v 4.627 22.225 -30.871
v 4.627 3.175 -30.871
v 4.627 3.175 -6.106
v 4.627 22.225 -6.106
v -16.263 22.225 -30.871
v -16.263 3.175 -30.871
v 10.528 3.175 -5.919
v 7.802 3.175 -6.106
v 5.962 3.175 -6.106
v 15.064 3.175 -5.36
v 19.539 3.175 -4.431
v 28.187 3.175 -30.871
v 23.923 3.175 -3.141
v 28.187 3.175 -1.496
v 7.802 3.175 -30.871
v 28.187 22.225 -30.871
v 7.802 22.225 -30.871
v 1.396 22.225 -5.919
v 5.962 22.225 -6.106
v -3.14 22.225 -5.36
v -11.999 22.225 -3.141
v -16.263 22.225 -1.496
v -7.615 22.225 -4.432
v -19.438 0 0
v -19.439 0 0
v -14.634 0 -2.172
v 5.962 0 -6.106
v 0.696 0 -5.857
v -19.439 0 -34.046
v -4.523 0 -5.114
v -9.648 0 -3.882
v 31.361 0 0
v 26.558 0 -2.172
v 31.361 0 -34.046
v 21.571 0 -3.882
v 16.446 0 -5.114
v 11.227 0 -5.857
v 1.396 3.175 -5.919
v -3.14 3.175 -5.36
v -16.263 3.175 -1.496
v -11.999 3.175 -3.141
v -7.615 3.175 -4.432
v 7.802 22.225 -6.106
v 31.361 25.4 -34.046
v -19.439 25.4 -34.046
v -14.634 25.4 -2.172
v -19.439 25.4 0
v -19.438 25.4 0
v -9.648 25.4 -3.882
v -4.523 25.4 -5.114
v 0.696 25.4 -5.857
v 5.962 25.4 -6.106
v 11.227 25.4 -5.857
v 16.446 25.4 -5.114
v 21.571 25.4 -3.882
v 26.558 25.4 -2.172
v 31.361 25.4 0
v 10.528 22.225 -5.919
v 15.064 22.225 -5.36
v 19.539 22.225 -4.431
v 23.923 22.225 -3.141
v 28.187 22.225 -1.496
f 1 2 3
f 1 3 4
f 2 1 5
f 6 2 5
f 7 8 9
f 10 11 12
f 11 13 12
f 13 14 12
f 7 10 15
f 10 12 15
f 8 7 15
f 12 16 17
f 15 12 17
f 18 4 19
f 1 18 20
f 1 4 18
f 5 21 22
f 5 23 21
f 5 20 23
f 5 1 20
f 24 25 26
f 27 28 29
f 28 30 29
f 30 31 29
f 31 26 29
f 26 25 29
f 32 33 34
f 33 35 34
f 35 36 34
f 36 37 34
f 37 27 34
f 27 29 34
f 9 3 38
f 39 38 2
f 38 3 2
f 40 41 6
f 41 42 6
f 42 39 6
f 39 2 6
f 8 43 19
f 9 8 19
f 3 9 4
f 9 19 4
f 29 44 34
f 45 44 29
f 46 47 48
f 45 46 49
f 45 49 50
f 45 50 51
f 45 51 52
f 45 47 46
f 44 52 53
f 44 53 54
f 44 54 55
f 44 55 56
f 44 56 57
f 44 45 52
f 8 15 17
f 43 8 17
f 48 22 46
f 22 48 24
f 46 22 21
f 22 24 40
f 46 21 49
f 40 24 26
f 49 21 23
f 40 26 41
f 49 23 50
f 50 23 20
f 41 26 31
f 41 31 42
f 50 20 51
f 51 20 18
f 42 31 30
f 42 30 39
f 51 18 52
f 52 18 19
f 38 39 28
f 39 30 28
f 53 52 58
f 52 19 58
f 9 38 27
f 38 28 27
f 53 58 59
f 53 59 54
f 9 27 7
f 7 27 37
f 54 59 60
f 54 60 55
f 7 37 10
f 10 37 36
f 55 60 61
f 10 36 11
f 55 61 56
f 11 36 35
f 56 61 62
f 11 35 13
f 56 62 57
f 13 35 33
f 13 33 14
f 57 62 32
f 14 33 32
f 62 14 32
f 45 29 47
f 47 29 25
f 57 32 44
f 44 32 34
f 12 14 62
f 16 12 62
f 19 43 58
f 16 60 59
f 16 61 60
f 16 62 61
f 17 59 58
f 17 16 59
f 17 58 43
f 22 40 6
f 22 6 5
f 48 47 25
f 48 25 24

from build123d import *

# Parameters (mm, degrees)
BOSS_EXTRUDE2_DEPTH = 25.4
CUT_EXTRUDE1_START  = -3.175
SKETCH3_W           = 44.45
SKETCH3_H           = 19.05
CUT_EXTRUDE1_DEPTH  = 50.624586707
SKETCH4_W           = 3.175
SKETCH4_H           = 25.4
BOSS_EXTRUDE3_DEPTH = 27.94


with BuildPart() as part:
    # Sketch1 → Boss-Extrude2 (new body)
    with BuildSketch(Plane(origin=(0, 0, 0), x_dir=(1, 0, 0), z_dir=(0, 1, 0))):
        with BuildLine():
            Line((31.360925226, 34.045979578), (-19.439074774, 34.045979578))
            Line((-19.439074774, 34.045979578), (-19.439074774, 0))
            Line((-19.439074774, 0), (-19.437550774, 0))
            ThreePointArc((-19.437550774, 0), (5.961687226, 6.105979578), (31.360925226, 0))
            Line((31.360925226, 0), (31.360925226, 34.045979578))
        make_face()
    extrude(amount=BOSS_EXTRUDE2_DEPTH)

    # Sketch3 → Cut-Extrude1 (cut, through all)
    with BuildSketch(Plane(origin=(0, 0, -34.045979578), x_dir=(-1, 0, 0), z_dir=(0, 0, -1)).offset(CUT_EXTRUDE1_START)):
        with Locations((-5.962449226, 12.7)):
            Rectangle(SKETCH3_W, SKETCH3_H)
    extrude(amount=-CUT_EXTRUDE1_DEPTH, mode=Mode.SUBTRACT)

    # Sketch4 → Boss-Extrude3 (add)
    with BuildSketch(Plane(origin=(0, 0, -34.045979578), x_dir=(-1, 0, 0), z_dir=(0, 0, -1))):
        with Locations((-6.214925226, 12.7)):
            Rectangle(SKETCH4_W, SKETCH4_H)
    extrude(amount=-BOSS_EXTRUDE3_DEPTH)


solid = part.part
